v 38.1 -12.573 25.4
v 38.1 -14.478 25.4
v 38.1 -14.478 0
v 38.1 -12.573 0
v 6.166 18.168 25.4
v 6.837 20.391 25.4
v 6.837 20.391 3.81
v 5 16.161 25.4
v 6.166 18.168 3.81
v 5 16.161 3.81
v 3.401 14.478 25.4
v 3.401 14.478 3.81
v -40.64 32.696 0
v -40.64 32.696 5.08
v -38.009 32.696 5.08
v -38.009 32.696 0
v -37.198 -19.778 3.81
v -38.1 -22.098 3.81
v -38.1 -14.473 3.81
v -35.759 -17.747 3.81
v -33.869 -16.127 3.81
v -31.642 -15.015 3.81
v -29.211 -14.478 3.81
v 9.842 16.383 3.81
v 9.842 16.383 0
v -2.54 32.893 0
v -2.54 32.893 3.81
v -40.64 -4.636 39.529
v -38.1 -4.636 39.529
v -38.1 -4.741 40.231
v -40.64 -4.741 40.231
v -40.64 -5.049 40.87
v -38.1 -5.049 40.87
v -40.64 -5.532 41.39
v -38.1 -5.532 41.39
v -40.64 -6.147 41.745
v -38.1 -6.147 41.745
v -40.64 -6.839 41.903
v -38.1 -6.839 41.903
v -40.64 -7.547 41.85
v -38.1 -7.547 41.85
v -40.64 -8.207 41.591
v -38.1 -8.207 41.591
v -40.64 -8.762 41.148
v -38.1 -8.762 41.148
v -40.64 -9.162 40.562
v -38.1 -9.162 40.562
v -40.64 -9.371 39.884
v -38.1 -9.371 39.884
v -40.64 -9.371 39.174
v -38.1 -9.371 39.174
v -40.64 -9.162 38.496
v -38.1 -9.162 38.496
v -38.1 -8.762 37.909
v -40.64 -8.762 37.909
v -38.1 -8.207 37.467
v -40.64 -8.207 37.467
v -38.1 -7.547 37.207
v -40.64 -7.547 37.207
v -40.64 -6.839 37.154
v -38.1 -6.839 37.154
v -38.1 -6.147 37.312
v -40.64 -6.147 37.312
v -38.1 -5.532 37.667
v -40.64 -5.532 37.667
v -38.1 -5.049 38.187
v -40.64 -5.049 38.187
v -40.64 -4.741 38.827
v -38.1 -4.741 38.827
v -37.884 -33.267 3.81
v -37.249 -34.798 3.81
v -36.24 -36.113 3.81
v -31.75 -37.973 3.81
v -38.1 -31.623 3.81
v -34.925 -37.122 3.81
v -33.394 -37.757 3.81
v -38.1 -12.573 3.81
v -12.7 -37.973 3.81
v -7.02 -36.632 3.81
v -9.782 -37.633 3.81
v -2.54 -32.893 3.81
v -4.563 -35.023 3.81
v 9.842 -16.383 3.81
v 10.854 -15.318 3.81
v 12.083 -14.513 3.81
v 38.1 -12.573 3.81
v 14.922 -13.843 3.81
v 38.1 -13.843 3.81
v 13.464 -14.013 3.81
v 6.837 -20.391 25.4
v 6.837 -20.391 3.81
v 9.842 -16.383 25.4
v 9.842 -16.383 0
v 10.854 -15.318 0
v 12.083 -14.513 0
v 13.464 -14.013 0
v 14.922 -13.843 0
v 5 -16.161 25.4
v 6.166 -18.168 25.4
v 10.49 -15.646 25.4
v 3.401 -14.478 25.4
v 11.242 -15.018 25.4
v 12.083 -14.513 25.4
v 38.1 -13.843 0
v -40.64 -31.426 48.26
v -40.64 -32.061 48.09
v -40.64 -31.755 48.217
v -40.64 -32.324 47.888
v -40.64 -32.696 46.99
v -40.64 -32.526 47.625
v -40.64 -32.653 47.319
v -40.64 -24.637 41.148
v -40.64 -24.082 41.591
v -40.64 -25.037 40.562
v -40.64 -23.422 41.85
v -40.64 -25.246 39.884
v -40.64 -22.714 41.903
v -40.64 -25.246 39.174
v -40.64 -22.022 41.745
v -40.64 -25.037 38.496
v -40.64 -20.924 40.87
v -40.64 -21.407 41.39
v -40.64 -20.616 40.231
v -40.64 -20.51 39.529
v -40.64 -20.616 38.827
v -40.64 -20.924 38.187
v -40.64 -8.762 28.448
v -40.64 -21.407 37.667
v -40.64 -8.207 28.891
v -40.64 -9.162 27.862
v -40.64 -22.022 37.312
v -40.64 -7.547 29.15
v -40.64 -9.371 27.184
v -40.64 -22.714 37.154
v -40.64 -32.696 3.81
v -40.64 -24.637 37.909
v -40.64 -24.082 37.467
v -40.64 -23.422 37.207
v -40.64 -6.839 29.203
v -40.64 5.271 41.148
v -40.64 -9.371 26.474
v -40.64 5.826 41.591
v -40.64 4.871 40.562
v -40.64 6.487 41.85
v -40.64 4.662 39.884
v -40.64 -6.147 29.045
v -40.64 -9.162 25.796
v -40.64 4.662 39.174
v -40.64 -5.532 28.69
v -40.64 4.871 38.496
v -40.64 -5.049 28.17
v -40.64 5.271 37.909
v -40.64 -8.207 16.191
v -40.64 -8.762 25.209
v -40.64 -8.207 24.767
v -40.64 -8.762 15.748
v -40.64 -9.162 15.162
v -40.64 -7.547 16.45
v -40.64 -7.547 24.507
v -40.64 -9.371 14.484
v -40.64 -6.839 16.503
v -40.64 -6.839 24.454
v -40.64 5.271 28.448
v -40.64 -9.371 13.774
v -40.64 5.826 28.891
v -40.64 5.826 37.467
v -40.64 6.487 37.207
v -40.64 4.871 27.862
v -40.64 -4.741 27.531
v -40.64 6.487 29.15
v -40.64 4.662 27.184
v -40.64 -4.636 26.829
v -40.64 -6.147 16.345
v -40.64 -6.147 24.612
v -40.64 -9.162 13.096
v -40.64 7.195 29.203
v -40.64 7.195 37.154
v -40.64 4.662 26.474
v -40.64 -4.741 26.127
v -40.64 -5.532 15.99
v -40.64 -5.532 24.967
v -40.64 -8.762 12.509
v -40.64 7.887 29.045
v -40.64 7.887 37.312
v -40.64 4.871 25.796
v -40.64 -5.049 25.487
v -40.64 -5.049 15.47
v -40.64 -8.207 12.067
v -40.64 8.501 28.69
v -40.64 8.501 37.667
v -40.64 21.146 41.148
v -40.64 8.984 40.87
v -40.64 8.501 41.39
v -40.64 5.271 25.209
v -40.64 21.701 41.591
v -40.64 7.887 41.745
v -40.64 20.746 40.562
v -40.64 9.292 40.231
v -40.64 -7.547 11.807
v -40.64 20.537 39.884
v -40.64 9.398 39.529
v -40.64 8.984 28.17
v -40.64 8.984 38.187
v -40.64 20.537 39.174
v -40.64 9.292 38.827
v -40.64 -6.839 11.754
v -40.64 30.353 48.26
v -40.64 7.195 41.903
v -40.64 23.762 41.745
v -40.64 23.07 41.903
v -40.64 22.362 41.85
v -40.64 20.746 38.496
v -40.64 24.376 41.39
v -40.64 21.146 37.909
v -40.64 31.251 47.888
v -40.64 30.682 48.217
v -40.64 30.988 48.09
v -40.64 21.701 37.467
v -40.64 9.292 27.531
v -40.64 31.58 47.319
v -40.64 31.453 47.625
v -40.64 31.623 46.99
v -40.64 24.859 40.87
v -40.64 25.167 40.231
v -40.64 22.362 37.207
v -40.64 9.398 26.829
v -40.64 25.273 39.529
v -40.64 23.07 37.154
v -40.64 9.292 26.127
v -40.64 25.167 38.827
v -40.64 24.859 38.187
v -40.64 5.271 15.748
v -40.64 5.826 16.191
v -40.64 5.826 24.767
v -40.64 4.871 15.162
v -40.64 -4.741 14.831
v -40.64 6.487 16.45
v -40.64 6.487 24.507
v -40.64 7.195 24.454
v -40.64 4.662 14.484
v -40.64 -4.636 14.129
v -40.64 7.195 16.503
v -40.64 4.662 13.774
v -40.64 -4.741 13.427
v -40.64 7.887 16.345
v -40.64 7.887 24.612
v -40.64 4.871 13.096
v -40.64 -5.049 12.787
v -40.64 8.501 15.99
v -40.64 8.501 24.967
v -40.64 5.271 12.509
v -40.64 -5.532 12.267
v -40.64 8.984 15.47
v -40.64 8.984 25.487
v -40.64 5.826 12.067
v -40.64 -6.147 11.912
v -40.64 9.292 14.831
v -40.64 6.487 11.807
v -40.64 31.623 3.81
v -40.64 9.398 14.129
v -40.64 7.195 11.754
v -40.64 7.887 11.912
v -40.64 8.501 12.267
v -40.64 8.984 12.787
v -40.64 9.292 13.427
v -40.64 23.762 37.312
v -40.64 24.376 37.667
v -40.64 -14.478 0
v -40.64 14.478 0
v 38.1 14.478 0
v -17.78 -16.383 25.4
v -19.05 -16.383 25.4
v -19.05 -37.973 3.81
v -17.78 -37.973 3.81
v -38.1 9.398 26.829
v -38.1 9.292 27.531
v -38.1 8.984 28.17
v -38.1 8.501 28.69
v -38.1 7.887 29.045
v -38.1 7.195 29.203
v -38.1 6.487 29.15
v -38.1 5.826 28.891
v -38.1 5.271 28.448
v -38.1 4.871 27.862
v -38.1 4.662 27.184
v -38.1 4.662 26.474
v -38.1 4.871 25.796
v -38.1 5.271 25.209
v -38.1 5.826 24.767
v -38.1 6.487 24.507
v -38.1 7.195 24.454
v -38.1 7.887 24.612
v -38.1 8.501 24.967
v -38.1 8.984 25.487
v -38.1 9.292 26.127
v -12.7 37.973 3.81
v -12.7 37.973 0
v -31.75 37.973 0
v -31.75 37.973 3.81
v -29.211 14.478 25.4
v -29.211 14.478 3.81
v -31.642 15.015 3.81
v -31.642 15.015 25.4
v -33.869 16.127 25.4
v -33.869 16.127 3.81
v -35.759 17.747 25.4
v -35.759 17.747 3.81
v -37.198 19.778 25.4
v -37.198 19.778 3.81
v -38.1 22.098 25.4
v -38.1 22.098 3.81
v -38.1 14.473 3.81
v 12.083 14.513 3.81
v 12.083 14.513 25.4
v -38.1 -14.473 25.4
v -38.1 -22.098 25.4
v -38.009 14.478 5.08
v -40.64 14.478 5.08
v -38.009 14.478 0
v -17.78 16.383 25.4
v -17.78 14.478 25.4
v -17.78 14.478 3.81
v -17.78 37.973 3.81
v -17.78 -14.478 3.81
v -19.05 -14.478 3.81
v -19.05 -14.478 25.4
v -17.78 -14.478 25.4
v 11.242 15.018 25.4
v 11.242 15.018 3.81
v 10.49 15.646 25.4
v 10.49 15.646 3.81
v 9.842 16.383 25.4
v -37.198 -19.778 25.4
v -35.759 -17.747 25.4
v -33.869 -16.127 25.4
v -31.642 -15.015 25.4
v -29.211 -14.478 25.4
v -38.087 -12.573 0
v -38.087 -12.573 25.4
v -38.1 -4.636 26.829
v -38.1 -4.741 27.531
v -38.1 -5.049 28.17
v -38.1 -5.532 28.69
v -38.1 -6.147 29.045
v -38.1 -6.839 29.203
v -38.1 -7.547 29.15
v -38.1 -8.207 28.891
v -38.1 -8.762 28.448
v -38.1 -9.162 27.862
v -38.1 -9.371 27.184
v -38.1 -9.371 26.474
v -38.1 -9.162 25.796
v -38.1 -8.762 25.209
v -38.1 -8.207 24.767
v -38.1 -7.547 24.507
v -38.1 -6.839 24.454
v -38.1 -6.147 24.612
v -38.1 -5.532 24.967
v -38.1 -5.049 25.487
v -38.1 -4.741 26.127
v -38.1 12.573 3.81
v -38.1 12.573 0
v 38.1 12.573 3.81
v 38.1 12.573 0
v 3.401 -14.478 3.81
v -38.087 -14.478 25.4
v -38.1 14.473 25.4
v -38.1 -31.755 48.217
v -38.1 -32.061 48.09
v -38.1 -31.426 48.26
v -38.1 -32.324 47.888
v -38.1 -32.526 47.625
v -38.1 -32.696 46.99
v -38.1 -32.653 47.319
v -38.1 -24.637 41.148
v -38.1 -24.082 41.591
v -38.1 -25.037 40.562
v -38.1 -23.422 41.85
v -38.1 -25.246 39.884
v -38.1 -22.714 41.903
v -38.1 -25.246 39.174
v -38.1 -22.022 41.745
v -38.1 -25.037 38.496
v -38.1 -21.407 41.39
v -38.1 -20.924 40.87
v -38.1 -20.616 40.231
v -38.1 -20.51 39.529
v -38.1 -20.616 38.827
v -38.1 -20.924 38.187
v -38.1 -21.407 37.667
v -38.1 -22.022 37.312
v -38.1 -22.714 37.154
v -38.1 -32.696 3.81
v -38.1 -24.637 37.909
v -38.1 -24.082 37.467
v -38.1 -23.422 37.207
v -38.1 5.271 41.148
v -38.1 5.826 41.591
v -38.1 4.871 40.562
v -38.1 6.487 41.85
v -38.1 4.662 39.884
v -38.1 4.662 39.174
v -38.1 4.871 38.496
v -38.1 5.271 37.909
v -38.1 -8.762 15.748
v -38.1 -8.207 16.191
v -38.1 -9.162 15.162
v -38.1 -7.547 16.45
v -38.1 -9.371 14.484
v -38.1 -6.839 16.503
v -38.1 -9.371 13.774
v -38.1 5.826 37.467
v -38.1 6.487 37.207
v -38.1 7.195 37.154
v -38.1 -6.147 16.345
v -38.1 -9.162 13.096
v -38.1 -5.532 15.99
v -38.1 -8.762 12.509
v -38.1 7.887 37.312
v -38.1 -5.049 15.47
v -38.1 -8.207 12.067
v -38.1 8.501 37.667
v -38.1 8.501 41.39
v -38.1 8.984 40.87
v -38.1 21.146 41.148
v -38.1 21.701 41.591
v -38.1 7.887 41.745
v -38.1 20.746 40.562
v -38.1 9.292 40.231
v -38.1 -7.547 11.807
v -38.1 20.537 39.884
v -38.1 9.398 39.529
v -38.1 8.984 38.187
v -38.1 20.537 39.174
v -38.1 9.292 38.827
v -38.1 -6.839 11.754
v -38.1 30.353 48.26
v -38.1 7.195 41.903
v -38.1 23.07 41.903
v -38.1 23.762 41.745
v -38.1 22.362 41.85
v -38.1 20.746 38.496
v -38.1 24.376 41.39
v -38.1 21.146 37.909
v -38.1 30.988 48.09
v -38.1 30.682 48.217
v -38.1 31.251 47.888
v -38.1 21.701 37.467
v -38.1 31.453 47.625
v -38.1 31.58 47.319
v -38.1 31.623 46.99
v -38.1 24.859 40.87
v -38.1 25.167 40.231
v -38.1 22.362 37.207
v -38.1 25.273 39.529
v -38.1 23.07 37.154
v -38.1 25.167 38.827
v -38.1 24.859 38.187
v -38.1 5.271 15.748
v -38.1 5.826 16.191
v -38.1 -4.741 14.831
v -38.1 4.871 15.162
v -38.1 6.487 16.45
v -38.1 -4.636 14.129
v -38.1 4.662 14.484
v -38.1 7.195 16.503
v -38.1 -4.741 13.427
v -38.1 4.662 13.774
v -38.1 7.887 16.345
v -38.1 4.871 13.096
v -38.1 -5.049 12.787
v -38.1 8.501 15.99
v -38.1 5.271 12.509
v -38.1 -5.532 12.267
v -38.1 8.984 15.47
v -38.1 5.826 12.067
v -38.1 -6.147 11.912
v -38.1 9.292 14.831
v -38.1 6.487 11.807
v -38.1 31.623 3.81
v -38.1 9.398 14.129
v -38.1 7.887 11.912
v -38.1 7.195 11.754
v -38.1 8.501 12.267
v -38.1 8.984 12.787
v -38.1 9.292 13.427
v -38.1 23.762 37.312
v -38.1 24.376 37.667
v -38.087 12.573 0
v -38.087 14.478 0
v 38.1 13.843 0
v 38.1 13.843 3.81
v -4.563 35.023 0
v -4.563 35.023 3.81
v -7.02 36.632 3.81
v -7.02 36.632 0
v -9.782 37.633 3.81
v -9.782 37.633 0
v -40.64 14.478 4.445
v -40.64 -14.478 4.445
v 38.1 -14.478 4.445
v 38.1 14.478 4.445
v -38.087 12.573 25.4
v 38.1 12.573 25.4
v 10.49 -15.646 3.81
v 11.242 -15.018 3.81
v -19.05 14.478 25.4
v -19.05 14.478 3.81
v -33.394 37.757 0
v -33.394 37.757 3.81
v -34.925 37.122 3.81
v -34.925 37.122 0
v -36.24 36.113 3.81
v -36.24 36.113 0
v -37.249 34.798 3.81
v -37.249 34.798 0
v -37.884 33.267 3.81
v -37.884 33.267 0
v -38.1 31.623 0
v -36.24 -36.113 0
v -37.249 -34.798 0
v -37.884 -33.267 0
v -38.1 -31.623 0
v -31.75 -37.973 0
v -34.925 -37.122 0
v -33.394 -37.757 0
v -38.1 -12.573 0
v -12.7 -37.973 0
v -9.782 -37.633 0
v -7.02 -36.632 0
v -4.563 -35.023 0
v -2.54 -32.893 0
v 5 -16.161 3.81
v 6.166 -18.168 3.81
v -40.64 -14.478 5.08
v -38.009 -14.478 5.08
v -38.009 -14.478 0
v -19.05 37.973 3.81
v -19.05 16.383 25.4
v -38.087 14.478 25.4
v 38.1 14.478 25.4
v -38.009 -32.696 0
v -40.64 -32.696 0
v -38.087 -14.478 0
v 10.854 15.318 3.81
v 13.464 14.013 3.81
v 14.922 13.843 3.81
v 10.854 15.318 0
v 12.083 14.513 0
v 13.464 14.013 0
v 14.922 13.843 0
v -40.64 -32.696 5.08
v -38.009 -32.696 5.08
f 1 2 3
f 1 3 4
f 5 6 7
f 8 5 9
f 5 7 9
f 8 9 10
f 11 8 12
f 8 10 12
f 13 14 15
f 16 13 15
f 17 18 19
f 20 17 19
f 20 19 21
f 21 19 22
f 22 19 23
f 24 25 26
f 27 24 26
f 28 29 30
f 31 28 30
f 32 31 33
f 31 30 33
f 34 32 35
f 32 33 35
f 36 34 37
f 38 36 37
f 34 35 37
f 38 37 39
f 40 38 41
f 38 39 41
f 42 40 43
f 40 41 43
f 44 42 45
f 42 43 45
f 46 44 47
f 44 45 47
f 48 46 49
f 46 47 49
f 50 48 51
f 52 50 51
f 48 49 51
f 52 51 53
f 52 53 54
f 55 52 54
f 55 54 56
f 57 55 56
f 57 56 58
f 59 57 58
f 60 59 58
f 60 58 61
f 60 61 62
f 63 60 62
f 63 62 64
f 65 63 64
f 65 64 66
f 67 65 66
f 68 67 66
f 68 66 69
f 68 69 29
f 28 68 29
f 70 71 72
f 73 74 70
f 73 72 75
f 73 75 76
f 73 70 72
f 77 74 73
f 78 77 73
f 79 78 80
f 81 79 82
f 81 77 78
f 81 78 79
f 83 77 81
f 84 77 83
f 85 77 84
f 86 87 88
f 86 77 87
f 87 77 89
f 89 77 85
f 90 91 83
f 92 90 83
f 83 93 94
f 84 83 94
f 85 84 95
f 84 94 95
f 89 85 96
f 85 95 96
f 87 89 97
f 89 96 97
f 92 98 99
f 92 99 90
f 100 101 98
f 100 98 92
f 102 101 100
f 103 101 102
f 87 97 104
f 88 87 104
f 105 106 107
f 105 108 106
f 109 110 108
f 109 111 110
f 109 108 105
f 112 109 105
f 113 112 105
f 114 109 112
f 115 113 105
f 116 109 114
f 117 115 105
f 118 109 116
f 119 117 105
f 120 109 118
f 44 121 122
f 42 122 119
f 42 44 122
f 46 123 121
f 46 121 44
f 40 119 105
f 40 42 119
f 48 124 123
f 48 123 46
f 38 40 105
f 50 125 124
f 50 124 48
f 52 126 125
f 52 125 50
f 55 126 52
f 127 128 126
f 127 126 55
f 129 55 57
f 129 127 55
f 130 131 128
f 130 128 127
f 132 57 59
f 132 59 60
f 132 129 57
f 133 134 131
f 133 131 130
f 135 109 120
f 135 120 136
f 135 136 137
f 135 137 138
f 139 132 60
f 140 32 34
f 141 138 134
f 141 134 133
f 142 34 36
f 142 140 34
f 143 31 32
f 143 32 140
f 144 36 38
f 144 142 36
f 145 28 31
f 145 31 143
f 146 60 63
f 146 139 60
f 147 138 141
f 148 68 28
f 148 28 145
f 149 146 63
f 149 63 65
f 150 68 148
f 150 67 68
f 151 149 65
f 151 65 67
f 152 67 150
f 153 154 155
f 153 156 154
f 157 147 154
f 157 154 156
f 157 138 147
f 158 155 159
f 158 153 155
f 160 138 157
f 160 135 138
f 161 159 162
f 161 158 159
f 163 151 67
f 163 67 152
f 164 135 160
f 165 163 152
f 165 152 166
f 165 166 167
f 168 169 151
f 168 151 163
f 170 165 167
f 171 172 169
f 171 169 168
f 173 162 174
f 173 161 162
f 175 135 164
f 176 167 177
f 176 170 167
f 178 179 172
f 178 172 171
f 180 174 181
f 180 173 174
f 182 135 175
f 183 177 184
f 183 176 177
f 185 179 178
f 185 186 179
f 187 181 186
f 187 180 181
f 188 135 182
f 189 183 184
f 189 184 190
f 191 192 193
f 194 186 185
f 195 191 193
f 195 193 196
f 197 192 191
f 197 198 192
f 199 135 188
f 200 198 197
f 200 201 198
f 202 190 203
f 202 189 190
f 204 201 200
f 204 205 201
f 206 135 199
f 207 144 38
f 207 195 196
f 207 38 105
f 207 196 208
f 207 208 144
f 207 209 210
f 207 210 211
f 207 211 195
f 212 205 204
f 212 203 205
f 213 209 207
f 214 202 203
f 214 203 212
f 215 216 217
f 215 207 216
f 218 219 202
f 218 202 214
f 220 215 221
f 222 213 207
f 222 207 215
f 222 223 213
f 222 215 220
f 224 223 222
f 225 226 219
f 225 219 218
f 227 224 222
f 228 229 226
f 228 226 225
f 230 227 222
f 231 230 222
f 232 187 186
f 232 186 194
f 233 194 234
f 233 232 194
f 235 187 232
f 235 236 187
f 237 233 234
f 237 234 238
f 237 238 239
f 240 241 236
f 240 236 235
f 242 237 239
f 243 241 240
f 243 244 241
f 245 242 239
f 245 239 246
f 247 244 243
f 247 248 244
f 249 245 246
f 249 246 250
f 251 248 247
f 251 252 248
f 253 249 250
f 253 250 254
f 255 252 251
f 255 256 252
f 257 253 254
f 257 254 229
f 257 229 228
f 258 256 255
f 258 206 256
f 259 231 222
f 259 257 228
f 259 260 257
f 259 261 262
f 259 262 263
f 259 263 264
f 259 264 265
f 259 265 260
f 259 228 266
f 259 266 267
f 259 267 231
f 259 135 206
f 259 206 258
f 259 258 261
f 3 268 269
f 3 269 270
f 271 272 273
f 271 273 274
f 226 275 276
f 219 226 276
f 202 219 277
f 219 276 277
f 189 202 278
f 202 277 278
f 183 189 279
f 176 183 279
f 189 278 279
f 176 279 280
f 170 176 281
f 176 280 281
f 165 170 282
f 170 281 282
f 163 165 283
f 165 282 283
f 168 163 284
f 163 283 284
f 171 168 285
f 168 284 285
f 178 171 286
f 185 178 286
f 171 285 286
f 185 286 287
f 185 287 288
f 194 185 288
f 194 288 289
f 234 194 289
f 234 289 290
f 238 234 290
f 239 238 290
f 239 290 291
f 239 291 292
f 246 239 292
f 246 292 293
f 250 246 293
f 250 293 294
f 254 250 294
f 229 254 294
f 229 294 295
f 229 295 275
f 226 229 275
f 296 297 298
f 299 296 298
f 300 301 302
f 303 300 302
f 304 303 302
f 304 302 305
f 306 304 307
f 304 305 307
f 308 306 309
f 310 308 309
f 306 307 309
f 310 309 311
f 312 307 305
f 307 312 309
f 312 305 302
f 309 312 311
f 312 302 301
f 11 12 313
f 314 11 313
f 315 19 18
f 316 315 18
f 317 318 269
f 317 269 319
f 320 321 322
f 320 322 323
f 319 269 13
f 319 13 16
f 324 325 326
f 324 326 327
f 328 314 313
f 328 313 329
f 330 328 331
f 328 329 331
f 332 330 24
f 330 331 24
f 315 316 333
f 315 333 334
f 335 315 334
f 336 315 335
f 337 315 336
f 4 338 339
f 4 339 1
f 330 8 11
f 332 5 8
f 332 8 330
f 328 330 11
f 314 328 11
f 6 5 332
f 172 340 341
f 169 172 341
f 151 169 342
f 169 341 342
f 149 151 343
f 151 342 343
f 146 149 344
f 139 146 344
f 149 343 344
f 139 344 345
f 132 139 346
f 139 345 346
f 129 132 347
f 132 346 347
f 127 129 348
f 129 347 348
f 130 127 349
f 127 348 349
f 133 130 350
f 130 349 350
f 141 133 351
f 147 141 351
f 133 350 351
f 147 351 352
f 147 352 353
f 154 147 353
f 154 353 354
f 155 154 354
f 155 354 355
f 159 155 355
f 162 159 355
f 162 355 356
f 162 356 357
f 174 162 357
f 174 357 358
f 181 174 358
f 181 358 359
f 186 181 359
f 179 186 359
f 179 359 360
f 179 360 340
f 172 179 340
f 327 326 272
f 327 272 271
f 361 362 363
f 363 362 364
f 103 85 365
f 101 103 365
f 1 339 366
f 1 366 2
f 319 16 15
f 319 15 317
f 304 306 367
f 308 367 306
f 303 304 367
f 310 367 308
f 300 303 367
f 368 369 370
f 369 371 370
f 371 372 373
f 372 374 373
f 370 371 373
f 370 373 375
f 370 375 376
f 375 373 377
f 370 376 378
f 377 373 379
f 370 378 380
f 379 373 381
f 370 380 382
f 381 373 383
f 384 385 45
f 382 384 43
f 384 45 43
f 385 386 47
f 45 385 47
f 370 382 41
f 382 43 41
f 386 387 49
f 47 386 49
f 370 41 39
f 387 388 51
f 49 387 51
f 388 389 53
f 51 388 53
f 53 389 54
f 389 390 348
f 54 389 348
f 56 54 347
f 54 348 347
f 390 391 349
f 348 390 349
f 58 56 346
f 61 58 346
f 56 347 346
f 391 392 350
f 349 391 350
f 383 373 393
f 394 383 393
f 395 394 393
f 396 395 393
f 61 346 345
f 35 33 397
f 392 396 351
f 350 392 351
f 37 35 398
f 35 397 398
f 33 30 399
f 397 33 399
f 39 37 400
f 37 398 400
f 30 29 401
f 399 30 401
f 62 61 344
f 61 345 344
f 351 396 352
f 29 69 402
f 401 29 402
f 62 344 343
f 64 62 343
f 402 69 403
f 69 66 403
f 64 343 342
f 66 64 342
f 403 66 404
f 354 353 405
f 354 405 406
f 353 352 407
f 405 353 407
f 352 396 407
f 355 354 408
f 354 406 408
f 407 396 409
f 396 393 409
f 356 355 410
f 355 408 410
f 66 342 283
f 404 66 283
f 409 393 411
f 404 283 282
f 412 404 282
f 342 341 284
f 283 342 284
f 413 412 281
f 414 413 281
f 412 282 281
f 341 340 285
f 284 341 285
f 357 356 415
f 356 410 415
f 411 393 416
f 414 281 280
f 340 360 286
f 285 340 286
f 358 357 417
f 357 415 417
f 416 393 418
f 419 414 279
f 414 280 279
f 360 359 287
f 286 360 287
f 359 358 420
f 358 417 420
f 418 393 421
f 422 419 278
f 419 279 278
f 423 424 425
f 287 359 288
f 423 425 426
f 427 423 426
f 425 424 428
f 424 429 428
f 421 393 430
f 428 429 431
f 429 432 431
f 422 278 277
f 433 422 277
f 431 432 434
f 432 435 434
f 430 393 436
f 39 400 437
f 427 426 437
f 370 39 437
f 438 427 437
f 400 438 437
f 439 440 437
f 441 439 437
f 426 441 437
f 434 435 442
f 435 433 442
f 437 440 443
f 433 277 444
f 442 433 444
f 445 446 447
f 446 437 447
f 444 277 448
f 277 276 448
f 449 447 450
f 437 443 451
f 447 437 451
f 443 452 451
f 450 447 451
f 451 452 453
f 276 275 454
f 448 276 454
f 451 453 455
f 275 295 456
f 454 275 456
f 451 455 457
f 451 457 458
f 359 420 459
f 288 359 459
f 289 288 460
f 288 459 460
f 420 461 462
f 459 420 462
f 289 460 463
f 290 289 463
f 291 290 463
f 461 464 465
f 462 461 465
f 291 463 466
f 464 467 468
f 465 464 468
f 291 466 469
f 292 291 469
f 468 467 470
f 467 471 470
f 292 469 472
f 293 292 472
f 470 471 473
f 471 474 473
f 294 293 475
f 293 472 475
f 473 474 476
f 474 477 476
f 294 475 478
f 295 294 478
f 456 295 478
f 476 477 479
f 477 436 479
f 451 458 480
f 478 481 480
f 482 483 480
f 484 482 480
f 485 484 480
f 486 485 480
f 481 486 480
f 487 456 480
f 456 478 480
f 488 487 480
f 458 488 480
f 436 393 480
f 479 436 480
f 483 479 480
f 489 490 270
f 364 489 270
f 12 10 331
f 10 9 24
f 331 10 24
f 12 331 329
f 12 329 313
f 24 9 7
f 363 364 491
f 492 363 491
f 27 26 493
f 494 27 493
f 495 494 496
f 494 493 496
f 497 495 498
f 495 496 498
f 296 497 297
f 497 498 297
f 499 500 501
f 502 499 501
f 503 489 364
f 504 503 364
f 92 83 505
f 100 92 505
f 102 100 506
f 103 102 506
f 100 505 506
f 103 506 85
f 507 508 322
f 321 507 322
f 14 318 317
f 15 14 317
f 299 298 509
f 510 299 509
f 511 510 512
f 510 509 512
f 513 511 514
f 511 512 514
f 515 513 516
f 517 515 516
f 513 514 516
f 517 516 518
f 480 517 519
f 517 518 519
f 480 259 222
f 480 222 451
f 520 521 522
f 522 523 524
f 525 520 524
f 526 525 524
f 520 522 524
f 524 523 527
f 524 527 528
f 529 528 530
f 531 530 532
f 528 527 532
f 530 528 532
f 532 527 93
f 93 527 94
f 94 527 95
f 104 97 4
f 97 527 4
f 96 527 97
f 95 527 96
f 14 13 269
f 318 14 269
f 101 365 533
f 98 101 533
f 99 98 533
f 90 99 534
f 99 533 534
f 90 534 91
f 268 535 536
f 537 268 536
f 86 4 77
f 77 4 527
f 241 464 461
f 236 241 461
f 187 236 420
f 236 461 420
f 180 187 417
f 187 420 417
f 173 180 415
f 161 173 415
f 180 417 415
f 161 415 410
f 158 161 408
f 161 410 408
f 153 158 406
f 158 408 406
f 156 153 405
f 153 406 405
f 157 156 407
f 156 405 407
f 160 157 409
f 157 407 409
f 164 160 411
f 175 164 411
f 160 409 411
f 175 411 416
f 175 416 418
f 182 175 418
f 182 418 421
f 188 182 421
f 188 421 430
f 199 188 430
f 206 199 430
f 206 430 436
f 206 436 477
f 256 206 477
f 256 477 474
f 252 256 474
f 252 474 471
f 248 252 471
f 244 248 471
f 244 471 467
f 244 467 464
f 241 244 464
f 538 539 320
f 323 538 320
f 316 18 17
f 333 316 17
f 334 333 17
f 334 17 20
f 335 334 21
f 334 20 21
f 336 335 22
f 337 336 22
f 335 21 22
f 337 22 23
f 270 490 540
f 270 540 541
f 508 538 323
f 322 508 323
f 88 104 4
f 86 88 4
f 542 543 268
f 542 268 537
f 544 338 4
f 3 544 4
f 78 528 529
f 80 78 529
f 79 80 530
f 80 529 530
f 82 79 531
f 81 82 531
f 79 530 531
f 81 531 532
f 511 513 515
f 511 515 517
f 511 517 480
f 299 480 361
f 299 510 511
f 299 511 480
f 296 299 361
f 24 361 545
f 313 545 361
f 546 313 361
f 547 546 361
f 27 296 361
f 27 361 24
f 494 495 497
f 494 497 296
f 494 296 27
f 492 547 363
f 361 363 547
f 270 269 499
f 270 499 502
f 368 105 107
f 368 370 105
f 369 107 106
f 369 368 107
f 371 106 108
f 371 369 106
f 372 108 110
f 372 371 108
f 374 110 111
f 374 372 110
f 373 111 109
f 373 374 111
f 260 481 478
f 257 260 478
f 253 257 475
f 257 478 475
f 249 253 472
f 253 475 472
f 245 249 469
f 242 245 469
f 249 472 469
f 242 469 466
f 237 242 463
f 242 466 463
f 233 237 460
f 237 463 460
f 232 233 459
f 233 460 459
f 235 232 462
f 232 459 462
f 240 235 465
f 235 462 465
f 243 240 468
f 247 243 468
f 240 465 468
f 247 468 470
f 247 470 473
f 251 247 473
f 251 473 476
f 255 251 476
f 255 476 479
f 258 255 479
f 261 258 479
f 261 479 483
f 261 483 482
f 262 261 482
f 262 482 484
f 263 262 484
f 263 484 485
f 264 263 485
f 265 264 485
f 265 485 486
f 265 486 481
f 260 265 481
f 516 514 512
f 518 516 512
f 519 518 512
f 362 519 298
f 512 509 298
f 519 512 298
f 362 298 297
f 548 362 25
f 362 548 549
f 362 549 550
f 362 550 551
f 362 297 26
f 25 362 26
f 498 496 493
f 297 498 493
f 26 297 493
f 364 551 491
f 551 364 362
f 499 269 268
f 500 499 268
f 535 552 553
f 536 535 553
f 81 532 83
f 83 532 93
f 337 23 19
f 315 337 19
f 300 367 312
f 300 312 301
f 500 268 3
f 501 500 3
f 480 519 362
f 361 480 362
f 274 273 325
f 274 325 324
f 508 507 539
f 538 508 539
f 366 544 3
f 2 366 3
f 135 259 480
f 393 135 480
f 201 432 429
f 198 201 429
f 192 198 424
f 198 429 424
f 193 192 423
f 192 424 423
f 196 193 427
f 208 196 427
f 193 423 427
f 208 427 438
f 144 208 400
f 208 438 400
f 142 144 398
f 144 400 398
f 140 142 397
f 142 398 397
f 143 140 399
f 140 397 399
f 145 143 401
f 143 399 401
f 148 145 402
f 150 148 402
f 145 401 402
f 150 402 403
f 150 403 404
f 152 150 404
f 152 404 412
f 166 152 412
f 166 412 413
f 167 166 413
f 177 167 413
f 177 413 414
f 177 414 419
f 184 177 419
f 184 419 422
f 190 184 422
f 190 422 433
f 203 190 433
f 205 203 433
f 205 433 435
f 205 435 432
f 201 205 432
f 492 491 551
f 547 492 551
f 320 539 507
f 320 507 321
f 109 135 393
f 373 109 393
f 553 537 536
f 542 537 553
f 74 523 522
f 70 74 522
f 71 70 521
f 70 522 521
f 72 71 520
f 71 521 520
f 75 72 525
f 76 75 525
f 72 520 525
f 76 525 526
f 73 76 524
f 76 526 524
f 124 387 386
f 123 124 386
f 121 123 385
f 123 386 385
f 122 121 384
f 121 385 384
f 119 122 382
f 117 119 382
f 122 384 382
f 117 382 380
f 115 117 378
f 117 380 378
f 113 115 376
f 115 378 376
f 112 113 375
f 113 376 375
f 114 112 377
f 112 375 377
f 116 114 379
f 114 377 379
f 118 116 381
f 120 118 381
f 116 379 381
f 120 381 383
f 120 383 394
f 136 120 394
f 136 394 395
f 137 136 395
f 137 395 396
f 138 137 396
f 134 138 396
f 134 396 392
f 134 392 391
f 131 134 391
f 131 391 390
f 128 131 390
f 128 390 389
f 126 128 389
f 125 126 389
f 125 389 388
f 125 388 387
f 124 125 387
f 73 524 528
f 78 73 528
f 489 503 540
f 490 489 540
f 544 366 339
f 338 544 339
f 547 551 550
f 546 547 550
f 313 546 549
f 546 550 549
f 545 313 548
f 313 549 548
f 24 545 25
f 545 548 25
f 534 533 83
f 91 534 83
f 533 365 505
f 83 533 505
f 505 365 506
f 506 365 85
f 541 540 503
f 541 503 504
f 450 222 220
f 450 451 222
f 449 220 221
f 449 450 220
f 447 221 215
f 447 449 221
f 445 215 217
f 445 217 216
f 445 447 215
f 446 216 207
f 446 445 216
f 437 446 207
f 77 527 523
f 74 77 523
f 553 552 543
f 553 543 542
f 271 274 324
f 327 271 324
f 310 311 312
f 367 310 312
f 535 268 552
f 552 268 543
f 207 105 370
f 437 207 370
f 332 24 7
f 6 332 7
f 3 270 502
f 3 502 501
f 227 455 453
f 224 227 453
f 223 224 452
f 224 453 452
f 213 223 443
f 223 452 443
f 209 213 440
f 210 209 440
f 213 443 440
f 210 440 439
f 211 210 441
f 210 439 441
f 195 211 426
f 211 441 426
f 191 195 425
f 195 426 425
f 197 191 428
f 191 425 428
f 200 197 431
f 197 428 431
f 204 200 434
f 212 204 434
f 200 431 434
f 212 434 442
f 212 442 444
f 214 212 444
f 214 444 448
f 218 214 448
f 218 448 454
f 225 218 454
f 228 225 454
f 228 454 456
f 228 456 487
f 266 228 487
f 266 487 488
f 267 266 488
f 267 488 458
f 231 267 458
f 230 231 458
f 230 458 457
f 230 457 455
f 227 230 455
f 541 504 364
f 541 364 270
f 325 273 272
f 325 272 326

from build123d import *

# Parameters (mm, degrees)
F1_DEPTH   = 3.81
F2_W       = 2.54
F2_H       = 64.319235925
F3_DEPTH   = 44.45
F4_R       = 1.27
F5_R       = 1.27
F6_W       = 76.1874727905
F6_H       = 1.905
F7_DEPTH   = 25.4
F9_DEPTH   = 21.59
F11_DEPTH  = 21.59
F12_W      = 1.27
F12_H      = 23.495
F13_DEPTH  = 21.59
F14_SIZE   = 21.58999
F14_2_SIZE = 21.58999
F15_R      = 2.38125
F16_DEPTH  = 2.541
F17_W      = 78.74
F17_H      = 28.956
F18_DEPTH  = 4.445
F19_W      = 2.63135281
F19_H      = 18.218235925
F20_DEPTH  = 5.08


# Not quite as in the source:
# - a fillet or chamfer is up to 0.001 mm smaller than in the source, because OpenCascade refuses the exact size


with BuildPart() as f1:
    # F0 (on Top) → F1 (new body)
    with BuildSketch(Plane.XY):
        with BuildLine():
            Line((-38.1, 31.623), (-38.1, 12.573))
            Line((-38.1, 12.573), (12.7, 12.573))
            Line((12.7, 12.573), (38.1, 12.573))
            Line((38.1, 12.573), (38.1, 13.843))
            Line((38.1, 13.843), (14.9225, 13.843))
            ThreePointArc((14.9225, 13.843), (12.0826936686, 14.5133873372), (9.8425, 16.383))
            Line((9.8425, 16.383), (-2.54, 32.893))
            ThreePointArc((-2.54, 32.893), (-7.0203873372, 36.6322253257), (-12.7, 37.973))
            Line((-12.7, 37.973), (-31.75, 37.973))
            ThreePointArc((-31.75, 37.973), (-36.2401280605, 36.1131280605), (-38.1, 31.623))
        make_face()
    extrude(amount=F1_DEPTH)


with BuildPart() as f1b:
    # F0 (on Top) → F1, piece 2 (new body)
    with BuildSketch(Plane.XY):
        with BuildLine():
            Line((14.9225, -13.843), (38.1, -13.843))
            Line((38.1, -13.843), (38.1, -12.573))
            Line((38.1, -12.573), (12.7, -12.573))
            Line((12.7, -12.573), (-38.1, -12.573))
            Line((-38.1, -12.573), (-38.1, -31.623))
            ThreePointArc((-38.1, -31.623), (-36.2401280605, -36.1131280605), (-31.75, -37.973))
            Line((-31.75, -37.973), (-12.7, -37.973))
            ThreePointArc((-12.7, -37.973), (-7.0203873372, -36.6322253257), (-2.54, -32.893))
            Line((-2.54, -32.893), (9.8425, -16.383))
            ThreePointArc((9.8425, -16.383), (12.0826936686, -14.5133873372), (14.9225, -13.843))
        make_face()
    extrude(amount=F1_DEPTH)


with BuildPart() as f3:
    # F2 (on face) → F3 (new body)
    with BuildSketch(Plane.XY.offset(3.81)):
        with Locations((-39.37, -0.5366179625)):
            Rectangle(F2_W, F2_H)
    extrude(amount=F3_DEPTH)

    # F4
    f4_edges = [f3.edges().sort_by_distance(p)[0] for p in [
        (-39.37, 31.623, 48.26),
    ]]
    fillet(f4_edges, radius=F4_R)

    # F5
    f5_edges = [f3.edges().sort_by_distance(p)[0] for p in [
        (-39.37, -32.696236, 48.26),
    ]]
    fillet(f5_edges, radius=F5_R)

    # F15 (on face) → F16 (cut, through all)
    with BuildSketch(Plane.YZ.offset(-38.1)):
        with Locations((22.89175, 39.52875)):
            Circle(F15_R)
        with Locations((7.01675, 39.52875)):
            Circle(F15_R)
        with Locations((7.01675, 26.82875)):
            Circle(F15_R)
        with Locations((7.01675, 14.12875)):
            Circle(F15_R)
        with Locations((-22.89175, 39.52875)):
            Circle(F15_R)
        with Locations((-7.01675, 26.82875)):
            Circle(F15_R)
        with Locations((-7.01675, 14.12875)):
            Circle(F15_R)
        with Locations((-7.01675, 39.52875)):
            Circle(F15_R)
    extrude(amount=-F16_DEPTH, mode=Mode.SUBTRACT)


with BuildPart() as f7:
    # F6 (on Top) → F7 (new body)
    with BuildSketch(Plane.XY):
        with Locations((0.0062636048, 13.5255)):
            Rectangle(F6_W, F6_H)
    extrude(amount=F7_DEPTH)


with BuildPart() as f7b:
    # F6 (on Top) → F7, piece 2 (new body)
    with BuildSketch(Plane.XY):
        with Locations((0.0062636048, -13.5255)):
            Rectangle(F6_W, F6_H)
    extrude(amount=F7_DEPTH)


with BuildPart() as f9:
    # F8 (on face) → F9 (new body)
    with BuildSketch(Plane.XY.offset(3.81)):
        with BuildLine():
            ThreePointArc((-29.2110200971, 14.478), (-34.8634746859, 16.8788696345), (-38.1, 22.098))
            Line((-38.1, 22.098), (-38.1, 14.4734261557))
            Line((-38.1, 14.4734261557), (-29.2110200971, 14.478))
        make_face()
    extrude(amount=F9_DEPTH)


with BuildPart() as f9b:
    # F8 (on face) → F9, piece 2 (new body)
    with BuildSketch(Plane.XY.offset(3.81)):
        with BuildLine():
            Line((-38.1, -14.4734261557), (-38.1, -22.098))
            ThreePointArc((-38.1, -22.098), (-34.8634746859, -16.8788696345), (-29.2110200971, -14.478))
            Line((-29.2110200971, -14.478), (-38.1, -14.4734261557))
        make_face()
    extrude(amount=F9_DEPTH)


with BuildPart() as f11:
    # F10 (on face) → F11 (new body)
    with BuildSketch(Plane.XY.offset(3.81)):
        with BuildLine():
            ThreePointArc((6.8367980262, 20.3906026317), (5.6419248641, 17.1304778187), (3.4012782853, 14.478))
            Line((3.4012782853, 14.478), (12.0826936686, 14.5133873372))
            ThreePointArc((12.0826936686, 14.5133873372), (10.8537537608, 15.3177765137), (9.8425, 16.383))
            Line((9.8425, 16.383), (6.8367980262, 20.3906026317))
        make_face()
    extrude(amount=F11_DEPTH)


with BuildPart() as f11b:
    # F10 (on face) → F11, piece 2 (new body)
    with BuildSketch(Plane.XY.offset(3.81)):
        with BuildLine():
            Line((12.0826936686, -14.5133873372), (3.4012782853, -14.478))
            ThreePointArc((3.4012782853, -14.478), (5.6419248641, -17.1304778187), (6.8367980262, -20.3906026317))
            Line((6.8367980262, -20.3906026317), (9.8425, -16.383))
            ThreePointArc((9.8425, -16.383), (10.8537537608, -15.3177765137), (12.0826936686, -14.5133873372))
        make_face()
    extrude(amount=F11_DEPTH)


with BuildPart() as f13:
    # F12 (on face) → F13 (new body)
    with BuildSketch(Plane.XY.offset(3.81)):
        with Locations((-18.415, 26.2255)):
            Rectangle(F12_W, F12_H)
    extrude(amount=F13_DEPTH)

    # F14 (size 21.59 in the source; OpenCascade refuses exactly that, so slightly less here)
    f14_edges = [f13.edges().sort_by_distance(p)[0] for p in [
        (-18.415, 37.973, 25.4),
    ]]
    chamfer(f14_edges, length=F14_SIZE)


with BuildPart() as f13b:
    # F12 (on face) → F13, piece 2 (new body)
    with BuildSketch(Plane.XY.offset(3.81)):
        with Locations((-18.415, -26.2255)):
            Rectangle(F12_W, F12_H)
    extrude(amount=F13_DEPTH)

    # F14#2 (size 21.59 in the source; OpenCascade refuses exactly that, so slightly less here)
    f14_2_edges = [f13b.edges().sort_by_distance(p)[0] for p in [
        (-18.415, -37.973, 25.4),
    ]]
    chamfer(f14_2_edges, length=F14_2_SIZE)


with BuildPart() as f18:
    # F17 (on face) → F18 (new body)
    with BuildSketch(Plane(origin=(0, 0, 0), x_dir=(1, 0, 0), z_dir=(0, 0, -1))):
        with Locations((-1.27, 0)):
            Rectangle(F17_W, F17_H)
    extrude(amount=-F18_DEPTH)


with BuildPart() as f20:
    # F19 (on face) → F20 (new body)
    with BuildSketch(Plane(origin=(0, 0, 0), x_dir=(1, 0, 0), z_dir=(0, 0, -1))):
        with Locations((-39.324323595, 23.5871179625)):
            Rectangle(F19_W, F19_H)
    extrude(amount=-F20_DEPTH)


with BuildPart() as f20b:
    # F19 (on face) → F20, piece 2 (new body)
    with BuildSketch(Plane(origin=(0, 0, 0), x_dir=(1, 0, 0), z_dir=(0, 0, -1))):
        with Locations((-39.324323595, -23.5871179625)):
            Rectangle(F19_W, F19_H)
    extrude(amount=-F20_DEPTH)


solid = Compound([f1.part, f1b.part, f3.part, f7.part, f7b.part, f9.part, f9b.part, f11.part, f11b.part, f13.part, f13b.part, f18.part, f20.part, f20b.part])
